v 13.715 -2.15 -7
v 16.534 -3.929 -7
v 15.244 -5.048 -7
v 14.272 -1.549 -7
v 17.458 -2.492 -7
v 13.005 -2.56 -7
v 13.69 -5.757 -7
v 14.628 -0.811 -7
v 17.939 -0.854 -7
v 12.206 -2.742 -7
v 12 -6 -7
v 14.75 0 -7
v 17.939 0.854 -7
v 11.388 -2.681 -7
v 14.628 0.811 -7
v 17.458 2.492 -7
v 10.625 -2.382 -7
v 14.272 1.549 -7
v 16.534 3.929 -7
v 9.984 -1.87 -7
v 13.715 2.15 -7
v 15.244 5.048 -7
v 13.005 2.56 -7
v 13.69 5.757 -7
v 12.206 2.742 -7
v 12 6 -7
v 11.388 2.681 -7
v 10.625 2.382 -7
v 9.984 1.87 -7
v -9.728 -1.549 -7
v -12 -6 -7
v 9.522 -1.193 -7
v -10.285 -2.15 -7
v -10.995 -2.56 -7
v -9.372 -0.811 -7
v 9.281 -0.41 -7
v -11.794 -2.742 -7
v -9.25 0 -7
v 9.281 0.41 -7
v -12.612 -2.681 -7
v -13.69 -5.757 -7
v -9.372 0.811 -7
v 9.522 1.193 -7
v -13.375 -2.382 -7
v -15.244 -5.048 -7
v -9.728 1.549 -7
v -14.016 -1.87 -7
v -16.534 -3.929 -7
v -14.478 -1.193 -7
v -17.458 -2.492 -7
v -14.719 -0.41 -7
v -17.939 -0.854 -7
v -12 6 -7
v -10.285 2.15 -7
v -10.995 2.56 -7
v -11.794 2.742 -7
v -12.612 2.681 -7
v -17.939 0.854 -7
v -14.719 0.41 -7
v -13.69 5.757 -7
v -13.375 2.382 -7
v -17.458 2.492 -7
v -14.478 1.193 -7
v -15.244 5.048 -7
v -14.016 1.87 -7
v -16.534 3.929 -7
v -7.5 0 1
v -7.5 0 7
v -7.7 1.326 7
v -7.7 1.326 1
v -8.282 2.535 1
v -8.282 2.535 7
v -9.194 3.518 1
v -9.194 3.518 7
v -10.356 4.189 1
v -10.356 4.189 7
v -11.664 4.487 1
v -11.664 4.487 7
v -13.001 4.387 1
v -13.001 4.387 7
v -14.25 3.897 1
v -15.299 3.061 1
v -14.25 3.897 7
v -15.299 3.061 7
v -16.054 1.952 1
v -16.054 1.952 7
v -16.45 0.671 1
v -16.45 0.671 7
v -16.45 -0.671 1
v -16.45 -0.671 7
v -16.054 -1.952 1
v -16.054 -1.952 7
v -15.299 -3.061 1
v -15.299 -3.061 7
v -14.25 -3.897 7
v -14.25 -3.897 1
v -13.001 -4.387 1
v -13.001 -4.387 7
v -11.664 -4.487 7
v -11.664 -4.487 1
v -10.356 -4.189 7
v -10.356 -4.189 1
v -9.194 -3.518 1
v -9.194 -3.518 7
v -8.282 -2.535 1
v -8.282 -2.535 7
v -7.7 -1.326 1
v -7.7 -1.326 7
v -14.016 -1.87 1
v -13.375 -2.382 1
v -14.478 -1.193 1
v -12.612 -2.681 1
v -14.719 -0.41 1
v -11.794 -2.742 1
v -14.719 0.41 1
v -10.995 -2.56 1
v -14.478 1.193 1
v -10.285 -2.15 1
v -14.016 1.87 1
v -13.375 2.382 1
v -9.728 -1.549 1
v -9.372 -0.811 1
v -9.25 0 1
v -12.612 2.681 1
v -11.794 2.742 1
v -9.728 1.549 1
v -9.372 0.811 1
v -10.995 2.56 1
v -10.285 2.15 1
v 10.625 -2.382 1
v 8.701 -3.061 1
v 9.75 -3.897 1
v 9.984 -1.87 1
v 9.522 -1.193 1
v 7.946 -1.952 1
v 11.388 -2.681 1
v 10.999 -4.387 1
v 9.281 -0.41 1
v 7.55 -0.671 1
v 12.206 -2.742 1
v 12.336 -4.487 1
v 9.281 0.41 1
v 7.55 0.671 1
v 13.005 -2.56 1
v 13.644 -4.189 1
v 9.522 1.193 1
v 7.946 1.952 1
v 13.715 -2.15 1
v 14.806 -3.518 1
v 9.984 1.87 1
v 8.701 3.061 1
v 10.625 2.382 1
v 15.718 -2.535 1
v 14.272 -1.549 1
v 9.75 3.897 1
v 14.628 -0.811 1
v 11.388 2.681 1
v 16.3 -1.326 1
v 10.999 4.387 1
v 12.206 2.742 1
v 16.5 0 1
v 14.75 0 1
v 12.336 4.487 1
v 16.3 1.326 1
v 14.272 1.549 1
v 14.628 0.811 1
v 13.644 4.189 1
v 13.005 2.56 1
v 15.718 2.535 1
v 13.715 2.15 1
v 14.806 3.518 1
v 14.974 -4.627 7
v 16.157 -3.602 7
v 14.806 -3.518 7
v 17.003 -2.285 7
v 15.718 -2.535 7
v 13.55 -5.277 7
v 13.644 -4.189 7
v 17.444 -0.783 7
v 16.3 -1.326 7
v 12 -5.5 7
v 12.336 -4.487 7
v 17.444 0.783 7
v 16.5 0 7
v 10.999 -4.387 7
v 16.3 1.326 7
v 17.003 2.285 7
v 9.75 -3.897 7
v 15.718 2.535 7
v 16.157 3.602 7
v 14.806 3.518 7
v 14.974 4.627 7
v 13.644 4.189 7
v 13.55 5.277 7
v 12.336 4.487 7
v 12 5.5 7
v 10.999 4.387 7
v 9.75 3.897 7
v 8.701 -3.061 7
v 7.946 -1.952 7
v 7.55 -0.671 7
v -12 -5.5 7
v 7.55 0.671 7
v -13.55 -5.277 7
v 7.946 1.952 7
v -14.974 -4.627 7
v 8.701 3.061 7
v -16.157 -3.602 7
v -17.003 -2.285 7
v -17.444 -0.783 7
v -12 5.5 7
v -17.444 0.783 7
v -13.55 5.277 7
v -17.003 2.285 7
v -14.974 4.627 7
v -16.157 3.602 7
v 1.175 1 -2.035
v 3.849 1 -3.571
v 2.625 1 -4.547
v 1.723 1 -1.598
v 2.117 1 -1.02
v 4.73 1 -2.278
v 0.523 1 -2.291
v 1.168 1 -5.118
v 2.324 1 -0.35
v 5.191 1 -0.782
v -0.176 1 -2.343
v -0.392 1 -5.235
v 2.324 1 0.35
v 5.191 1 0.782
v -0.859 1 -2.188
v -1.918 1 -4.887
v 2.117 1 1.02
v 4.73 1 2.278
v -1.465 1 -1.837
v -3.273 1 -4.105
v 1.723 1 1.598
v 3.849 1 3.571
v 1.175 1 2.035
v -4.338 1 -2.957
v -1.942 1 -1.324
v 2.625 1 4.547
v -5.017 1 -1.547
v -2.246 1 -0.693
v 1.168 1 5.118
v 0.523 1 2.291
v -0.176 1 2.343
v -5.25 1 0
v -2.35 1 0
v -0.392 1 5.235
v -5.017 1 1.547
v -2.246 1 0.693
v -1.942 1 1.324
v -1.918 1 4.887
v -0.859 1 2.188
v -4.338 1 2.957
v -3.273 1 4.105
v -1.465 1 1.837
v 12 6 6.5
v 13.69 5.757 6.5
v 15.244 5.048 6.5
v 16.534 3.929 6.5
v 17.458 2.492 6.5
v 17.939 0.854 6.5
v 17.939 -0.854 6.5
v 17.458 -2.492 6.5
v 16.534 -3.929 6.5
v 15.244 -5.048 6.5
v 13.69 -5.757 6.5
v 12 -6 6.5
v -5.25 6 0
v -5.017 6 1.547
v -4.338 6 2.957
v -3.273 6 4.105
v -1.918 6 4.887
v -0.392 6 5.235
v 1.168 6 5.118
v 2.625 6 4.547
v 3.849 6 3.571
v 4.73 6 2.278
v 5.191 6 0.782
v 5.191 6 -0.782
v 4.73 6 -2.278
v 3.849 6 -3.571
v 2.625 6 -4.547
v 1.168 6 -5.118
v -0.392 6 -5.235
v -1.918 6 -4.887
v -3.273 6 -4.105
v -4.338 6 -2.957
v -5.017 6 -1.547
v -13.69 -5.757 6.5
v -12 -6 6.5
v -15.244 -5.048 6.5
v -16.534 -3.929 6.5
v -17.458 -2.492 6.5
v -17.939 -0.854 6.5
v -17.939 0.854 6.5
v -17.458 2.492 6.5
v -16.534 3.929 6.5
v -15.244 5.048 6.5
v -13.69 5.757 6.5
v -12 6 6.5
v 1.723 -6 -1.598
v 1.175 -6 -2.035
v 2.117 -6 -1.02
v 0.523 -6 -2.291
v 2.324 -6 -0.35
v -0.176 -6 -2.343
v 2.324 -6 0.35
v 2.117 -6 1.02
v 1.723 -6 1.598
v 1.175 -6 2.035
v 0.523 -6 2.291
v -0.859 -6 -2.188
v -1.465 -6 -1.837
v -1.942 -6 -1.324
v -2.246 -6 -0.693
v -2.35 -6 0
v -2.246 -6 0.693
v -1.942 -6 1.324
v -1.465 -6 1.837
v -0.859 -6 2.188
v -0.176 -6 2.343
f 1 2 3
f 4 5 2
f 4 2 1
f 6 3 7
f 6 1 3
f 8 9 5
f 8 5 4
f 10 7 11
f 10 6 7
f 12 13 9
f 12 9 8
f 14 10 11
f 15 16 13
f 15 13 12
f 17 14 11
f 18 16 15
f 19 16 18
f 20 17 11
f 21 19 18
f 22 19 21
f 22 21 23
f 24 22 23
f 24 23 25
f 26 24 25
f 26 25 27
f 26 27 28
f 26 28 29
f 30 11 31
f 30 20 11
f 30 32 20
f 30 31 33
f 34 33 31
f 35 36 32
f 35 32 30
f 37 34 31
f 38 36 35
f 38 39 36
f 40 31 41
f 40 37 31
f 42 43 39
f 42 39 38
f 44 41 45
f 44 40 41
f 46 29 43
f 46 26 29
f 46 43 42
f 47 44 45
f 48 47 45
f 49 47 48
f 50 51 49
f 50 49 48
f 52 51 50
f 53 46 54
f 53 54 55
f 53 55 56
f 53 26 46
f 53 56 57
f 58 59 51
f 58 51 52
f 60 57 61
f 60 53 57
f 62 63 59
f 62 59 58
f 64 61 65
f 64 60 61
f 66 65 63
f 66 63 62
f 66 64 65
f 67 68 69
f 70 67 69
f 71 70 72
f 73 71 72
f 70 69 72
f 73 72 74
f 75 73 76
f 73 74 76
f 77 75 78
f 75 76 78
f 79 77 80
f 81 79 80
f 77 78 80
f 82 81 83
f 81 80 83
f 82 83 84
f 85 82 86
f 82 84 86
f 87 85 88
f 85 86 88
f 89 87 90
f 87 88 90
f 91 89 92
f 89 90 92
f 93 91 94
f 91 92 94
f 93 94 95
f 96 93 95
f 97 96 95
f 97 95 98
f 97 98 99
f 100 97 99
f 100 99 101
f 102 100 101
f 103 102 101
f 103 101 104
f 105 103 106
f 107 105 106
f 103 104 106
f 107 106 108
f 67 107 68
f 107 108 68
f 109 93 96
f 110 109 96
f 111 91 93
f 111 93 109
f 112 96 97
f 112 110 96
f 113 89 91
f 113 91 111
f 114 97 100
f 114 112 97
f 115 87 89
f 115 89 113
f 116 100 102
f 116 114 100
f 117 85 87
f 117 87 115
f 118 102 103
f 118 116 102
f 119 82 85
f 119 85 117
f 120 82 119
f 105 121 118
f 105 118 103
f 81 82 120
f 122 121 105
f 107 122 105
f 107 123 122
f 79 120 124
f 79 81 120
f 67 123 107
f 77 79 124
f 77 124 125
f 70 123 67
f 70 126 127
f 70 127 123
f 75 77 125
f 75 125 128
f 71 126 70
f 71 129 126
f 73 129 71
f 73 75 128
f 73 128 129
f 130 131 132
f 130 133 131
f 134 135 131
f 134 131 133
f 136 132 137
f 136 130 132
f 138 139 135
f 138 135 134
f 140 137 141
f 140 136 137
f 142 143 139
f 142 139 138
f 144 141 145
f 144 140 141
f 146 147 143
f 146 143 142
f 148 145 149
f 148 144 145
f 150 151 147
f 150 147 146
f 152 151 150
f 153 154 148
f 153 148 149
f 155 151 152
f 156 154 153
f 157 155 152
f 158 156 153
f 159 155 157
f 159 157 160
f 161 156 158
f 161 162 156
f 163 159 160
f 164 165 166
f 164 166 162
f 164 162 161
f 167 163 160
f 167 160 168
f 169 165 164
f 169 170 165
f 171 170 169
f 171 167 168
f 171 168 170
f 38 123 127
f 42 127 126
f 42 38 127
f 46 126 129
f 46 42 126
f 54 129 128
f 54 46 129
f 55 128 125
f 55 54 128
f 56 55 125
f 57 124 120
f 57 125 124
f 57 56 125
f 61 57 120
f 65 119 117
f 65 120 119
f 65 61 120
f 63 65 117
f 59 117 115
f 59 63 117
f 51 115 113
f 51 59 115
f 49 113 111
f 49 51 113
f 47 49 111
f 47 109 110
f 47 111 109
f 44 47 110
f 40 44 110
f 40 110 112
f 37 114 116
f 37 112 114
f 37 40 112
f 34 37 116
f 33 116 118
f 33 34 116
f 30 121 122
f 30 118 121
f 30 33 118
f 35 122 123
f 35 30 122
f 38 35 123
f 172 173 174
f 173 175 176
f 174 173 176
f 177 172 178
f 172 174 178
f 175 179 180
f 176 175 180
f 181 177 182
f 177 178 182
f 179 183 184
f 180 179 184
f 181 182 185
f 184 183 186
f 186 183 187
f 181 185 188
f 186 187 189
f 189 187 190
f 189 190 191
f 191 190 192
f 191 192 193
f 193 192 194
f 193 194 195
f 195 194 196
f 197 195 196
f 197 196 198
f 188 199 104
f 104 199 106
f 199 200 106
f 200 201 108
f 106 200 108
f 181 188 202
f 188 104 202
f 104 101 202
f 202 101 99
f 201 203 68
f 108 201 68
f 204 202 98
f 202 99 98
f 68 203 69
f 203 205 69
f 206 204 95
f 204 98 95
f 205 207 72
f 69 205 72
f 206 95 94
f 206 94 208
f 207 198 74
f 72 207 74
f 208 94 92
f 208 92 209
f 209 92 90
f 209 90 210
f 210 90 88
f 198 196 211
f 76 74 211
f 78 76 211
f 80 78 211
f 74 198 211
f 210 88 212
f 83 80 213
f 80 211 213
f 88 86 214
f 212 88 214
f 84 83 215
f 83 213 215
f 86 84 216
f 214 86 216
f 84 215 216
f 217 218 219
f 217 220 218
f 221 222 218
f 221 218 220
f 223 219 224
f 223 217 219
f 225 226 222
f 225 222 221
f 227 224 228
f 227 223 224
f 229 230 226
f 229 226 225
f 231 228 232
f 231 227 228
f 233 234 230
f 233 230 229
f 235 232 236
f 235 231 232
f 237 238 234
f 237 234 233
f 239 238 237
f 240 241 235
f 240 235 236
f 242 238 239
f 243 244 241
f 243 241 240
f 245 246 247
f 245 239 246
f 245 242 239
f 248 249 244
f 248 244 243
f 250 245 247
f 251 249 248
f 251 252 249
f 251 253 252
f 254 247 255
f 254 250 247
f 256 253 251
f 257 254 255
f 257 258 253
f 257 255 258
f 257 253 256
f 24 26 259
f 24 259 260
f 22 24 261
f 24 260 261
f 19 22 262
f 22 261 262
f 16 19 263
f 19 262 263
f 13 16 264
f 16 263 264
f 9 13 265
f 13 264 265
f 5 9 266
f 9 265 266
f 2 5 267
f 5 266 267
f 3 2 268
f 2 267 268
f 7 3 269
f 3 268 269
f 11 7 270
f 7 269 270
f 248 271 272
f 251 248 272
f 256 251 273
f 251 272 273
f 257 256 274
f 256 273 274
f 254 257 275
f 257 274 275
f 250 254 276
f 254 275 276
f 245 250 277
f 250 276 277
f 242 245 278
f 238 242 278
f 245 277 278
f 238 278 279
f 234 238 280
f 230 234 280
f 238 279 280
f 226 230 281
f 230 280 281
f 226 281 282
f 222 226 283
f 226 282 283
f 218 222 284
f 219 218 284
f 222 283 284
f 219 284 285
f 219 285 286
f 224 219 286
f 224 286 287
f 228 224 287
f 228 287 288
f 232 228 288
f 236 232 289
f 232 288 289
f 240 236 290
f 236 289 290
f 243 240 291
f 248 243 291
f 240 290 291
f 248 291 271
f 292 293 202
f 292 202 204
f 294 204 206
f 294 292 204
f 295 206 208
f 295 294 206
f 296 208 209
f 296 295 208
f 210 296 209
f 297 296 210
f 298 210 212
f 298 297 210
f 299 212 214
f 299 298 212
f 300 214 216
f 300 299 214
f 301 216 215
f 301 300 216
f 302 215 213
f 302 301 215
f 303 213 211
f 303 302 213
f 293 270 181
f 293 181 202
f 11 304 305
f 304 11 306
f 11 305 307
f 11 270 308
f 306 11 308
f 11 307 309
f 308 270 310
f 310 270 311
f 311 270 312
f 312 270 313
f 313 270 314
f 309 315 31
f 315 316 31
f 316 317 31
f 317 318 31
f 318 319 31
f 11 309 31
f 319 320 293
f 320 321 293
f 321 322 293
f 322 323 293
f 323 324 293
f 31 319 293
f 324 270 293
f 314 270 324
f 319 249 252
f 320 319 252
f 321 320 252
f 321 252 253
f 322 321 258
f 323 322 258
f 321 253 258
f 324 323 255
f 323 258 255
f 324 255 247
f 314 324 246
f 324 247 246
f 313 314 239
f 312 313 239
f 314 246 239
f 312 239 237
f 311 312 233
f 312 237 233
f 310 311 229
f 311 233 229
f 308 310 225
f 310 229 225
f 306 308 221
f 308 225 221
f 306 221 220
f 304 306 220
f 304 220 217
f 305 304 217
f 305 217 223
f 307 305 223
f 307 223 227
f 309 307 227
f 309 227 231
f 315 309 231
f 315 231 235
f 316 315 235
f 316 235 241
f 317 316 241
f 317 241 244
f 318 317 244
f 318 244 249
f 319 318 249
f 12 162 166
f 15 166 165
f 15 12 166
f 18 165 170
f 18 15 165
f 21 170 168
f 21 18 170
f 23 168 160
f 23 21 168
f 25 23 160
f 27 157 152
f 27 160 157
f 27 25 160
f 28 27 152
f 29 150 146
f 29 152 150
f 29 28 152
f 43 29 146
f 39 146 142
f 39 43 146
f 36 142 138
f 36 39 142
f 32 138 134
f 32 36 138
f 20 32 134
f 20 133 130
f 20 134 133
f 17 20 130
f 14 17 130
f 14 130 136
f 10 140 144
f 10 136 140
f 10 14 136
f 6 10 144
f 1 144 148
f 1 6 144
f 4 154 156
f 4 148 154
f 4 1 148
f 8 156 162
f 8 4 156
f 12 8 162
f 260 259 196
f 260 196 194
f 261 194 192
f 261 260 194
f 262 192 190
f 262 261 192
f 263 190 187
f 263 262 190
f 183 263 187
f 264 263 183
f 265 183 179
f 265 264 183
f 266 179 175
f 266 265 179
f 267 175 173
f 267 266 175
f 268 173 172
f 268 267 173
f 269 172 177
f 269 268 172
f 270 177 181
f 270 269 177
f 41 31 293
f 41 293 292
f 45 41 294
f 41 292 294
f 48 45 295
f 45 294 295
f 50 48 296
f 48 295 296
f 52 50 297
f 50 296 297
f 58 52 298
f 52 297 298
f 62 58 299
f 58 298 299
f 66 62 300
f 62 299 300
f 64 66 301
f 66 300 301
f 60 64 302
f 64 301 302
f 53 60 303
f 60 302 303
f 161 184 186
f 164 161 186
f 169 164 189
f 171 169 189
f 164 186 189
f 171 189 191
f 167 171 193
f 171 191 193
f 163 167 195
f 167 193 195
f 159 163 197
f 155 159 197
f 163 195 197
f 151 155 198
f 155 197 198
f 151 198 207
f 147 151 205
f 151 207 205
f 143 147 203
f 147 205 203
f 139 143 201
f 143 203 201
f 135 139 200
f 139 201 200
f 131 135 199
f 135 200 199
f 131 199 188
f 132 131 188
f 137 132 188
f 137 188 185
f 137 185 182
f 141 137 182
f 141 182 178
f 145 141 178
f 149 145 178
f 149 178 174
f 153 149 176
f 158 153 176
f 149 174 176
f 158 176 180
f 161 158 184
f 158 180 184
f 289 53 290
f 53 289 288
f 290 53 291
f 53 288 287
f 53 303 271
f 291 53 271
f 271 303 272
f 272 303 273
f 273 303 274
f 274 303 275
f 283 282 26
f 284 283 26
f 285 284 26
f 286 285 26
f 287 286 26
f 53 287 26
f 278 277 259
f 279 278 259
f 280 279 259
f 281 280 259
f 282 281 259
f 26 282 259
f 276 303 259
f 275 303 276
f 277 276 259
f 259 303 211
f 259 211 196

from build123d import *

# Parameters (mm, degrees)
SKETCH1_R           = 2.75
BOSS_EXTRUDE1_DEPTH = 7
SKETCH2_R           = 2.35
CUT_EXTRUDE1_DEPTH  = 23.737634002
SKETCH3_R           = 5.25
CUT_EXTRUDE2_DEPTH  = 5
CHAMFER1_SIZE       = 0.5
SKETCH4_R           = 4.5
CUT_EXTRUDE3_DEPTH  = 6


with BuildPart() as part:
    # Sketch1 → Boss-Extrude1 (new, symmetric)
    with BuildSketch(Plane.XY):
        with BuildLine():
            Line((12, -6), (-12, -6))
            ThreePointArc((-12, -6), (-18, 0), (-12, 6))
            Line((-12, 6), (12, 6))
            ThreePointArc((12, 6), (18, 0), (12, -6))
        make_face()
        with Locations((-12, 0)):
            Circle(SKETCH1_R, mode=Mode.SUBTRACT)
        with Locations((12, 0)):
            Circle(SKETCH1_R, mode=Mode.SUBTRACT)
    extrude(amount=BOSS_EXTRUDE1_DEPTH, both=True)

    # Sketch2 → Cut-Extrude1 (cut, through all)
    with BuildSketch(Plane(origin=(0, 6, 0), x_dir=(1, 0, 0), z_dir=(0, 1, 0))):
        with Locations(Location((0, 0, 0), (0, 0, 180))):
            Circle(SKETCH2_R)
    extrude(amount=-CUT_EXTRUDE1_DEPTH, mode=Mode.SUBTRACT)

    # Sketch3 → Cut-Extrude2 (cut)
    with BuildSketch(Plane(origin=(0, 6, 0), x_dir=(1, 0, 0), z_dir=(0, 1, 0))):
        with Locations(Location((0, 0, 0), (0, 0, 180))):
            Circle(SKETCH3_R)
    extrude(amount=-CUT_EXTRUDE2_DEPTH, mode=Mode.SUBTRACT)

    # Chamfer1
    chamfer1_edges = [part.edges().sort_by_distance(p)[0] for p in [
        (-18, 0, 7),
        (0, -6, 7),
        (18, 0, 7),
        (0, 6, 7),
    ]]
    chamfer(chamfer1_edges, length=CHAMFER1_SIZE)

    # Sketch4 → Cut-Extrude3 (cut)
    with BuildSketch(Plane.XY.offset(7)):
        with Locations((-12, 0)):
            Circle(SKETCH4_R)
        with Locations((12, 0)):
            Circle(SKETCH4_R)
    extrude(amount=-CUT_EXTRUDE3_DEPTH, mode=Mode.SUBTRACT)


solid = part.part
